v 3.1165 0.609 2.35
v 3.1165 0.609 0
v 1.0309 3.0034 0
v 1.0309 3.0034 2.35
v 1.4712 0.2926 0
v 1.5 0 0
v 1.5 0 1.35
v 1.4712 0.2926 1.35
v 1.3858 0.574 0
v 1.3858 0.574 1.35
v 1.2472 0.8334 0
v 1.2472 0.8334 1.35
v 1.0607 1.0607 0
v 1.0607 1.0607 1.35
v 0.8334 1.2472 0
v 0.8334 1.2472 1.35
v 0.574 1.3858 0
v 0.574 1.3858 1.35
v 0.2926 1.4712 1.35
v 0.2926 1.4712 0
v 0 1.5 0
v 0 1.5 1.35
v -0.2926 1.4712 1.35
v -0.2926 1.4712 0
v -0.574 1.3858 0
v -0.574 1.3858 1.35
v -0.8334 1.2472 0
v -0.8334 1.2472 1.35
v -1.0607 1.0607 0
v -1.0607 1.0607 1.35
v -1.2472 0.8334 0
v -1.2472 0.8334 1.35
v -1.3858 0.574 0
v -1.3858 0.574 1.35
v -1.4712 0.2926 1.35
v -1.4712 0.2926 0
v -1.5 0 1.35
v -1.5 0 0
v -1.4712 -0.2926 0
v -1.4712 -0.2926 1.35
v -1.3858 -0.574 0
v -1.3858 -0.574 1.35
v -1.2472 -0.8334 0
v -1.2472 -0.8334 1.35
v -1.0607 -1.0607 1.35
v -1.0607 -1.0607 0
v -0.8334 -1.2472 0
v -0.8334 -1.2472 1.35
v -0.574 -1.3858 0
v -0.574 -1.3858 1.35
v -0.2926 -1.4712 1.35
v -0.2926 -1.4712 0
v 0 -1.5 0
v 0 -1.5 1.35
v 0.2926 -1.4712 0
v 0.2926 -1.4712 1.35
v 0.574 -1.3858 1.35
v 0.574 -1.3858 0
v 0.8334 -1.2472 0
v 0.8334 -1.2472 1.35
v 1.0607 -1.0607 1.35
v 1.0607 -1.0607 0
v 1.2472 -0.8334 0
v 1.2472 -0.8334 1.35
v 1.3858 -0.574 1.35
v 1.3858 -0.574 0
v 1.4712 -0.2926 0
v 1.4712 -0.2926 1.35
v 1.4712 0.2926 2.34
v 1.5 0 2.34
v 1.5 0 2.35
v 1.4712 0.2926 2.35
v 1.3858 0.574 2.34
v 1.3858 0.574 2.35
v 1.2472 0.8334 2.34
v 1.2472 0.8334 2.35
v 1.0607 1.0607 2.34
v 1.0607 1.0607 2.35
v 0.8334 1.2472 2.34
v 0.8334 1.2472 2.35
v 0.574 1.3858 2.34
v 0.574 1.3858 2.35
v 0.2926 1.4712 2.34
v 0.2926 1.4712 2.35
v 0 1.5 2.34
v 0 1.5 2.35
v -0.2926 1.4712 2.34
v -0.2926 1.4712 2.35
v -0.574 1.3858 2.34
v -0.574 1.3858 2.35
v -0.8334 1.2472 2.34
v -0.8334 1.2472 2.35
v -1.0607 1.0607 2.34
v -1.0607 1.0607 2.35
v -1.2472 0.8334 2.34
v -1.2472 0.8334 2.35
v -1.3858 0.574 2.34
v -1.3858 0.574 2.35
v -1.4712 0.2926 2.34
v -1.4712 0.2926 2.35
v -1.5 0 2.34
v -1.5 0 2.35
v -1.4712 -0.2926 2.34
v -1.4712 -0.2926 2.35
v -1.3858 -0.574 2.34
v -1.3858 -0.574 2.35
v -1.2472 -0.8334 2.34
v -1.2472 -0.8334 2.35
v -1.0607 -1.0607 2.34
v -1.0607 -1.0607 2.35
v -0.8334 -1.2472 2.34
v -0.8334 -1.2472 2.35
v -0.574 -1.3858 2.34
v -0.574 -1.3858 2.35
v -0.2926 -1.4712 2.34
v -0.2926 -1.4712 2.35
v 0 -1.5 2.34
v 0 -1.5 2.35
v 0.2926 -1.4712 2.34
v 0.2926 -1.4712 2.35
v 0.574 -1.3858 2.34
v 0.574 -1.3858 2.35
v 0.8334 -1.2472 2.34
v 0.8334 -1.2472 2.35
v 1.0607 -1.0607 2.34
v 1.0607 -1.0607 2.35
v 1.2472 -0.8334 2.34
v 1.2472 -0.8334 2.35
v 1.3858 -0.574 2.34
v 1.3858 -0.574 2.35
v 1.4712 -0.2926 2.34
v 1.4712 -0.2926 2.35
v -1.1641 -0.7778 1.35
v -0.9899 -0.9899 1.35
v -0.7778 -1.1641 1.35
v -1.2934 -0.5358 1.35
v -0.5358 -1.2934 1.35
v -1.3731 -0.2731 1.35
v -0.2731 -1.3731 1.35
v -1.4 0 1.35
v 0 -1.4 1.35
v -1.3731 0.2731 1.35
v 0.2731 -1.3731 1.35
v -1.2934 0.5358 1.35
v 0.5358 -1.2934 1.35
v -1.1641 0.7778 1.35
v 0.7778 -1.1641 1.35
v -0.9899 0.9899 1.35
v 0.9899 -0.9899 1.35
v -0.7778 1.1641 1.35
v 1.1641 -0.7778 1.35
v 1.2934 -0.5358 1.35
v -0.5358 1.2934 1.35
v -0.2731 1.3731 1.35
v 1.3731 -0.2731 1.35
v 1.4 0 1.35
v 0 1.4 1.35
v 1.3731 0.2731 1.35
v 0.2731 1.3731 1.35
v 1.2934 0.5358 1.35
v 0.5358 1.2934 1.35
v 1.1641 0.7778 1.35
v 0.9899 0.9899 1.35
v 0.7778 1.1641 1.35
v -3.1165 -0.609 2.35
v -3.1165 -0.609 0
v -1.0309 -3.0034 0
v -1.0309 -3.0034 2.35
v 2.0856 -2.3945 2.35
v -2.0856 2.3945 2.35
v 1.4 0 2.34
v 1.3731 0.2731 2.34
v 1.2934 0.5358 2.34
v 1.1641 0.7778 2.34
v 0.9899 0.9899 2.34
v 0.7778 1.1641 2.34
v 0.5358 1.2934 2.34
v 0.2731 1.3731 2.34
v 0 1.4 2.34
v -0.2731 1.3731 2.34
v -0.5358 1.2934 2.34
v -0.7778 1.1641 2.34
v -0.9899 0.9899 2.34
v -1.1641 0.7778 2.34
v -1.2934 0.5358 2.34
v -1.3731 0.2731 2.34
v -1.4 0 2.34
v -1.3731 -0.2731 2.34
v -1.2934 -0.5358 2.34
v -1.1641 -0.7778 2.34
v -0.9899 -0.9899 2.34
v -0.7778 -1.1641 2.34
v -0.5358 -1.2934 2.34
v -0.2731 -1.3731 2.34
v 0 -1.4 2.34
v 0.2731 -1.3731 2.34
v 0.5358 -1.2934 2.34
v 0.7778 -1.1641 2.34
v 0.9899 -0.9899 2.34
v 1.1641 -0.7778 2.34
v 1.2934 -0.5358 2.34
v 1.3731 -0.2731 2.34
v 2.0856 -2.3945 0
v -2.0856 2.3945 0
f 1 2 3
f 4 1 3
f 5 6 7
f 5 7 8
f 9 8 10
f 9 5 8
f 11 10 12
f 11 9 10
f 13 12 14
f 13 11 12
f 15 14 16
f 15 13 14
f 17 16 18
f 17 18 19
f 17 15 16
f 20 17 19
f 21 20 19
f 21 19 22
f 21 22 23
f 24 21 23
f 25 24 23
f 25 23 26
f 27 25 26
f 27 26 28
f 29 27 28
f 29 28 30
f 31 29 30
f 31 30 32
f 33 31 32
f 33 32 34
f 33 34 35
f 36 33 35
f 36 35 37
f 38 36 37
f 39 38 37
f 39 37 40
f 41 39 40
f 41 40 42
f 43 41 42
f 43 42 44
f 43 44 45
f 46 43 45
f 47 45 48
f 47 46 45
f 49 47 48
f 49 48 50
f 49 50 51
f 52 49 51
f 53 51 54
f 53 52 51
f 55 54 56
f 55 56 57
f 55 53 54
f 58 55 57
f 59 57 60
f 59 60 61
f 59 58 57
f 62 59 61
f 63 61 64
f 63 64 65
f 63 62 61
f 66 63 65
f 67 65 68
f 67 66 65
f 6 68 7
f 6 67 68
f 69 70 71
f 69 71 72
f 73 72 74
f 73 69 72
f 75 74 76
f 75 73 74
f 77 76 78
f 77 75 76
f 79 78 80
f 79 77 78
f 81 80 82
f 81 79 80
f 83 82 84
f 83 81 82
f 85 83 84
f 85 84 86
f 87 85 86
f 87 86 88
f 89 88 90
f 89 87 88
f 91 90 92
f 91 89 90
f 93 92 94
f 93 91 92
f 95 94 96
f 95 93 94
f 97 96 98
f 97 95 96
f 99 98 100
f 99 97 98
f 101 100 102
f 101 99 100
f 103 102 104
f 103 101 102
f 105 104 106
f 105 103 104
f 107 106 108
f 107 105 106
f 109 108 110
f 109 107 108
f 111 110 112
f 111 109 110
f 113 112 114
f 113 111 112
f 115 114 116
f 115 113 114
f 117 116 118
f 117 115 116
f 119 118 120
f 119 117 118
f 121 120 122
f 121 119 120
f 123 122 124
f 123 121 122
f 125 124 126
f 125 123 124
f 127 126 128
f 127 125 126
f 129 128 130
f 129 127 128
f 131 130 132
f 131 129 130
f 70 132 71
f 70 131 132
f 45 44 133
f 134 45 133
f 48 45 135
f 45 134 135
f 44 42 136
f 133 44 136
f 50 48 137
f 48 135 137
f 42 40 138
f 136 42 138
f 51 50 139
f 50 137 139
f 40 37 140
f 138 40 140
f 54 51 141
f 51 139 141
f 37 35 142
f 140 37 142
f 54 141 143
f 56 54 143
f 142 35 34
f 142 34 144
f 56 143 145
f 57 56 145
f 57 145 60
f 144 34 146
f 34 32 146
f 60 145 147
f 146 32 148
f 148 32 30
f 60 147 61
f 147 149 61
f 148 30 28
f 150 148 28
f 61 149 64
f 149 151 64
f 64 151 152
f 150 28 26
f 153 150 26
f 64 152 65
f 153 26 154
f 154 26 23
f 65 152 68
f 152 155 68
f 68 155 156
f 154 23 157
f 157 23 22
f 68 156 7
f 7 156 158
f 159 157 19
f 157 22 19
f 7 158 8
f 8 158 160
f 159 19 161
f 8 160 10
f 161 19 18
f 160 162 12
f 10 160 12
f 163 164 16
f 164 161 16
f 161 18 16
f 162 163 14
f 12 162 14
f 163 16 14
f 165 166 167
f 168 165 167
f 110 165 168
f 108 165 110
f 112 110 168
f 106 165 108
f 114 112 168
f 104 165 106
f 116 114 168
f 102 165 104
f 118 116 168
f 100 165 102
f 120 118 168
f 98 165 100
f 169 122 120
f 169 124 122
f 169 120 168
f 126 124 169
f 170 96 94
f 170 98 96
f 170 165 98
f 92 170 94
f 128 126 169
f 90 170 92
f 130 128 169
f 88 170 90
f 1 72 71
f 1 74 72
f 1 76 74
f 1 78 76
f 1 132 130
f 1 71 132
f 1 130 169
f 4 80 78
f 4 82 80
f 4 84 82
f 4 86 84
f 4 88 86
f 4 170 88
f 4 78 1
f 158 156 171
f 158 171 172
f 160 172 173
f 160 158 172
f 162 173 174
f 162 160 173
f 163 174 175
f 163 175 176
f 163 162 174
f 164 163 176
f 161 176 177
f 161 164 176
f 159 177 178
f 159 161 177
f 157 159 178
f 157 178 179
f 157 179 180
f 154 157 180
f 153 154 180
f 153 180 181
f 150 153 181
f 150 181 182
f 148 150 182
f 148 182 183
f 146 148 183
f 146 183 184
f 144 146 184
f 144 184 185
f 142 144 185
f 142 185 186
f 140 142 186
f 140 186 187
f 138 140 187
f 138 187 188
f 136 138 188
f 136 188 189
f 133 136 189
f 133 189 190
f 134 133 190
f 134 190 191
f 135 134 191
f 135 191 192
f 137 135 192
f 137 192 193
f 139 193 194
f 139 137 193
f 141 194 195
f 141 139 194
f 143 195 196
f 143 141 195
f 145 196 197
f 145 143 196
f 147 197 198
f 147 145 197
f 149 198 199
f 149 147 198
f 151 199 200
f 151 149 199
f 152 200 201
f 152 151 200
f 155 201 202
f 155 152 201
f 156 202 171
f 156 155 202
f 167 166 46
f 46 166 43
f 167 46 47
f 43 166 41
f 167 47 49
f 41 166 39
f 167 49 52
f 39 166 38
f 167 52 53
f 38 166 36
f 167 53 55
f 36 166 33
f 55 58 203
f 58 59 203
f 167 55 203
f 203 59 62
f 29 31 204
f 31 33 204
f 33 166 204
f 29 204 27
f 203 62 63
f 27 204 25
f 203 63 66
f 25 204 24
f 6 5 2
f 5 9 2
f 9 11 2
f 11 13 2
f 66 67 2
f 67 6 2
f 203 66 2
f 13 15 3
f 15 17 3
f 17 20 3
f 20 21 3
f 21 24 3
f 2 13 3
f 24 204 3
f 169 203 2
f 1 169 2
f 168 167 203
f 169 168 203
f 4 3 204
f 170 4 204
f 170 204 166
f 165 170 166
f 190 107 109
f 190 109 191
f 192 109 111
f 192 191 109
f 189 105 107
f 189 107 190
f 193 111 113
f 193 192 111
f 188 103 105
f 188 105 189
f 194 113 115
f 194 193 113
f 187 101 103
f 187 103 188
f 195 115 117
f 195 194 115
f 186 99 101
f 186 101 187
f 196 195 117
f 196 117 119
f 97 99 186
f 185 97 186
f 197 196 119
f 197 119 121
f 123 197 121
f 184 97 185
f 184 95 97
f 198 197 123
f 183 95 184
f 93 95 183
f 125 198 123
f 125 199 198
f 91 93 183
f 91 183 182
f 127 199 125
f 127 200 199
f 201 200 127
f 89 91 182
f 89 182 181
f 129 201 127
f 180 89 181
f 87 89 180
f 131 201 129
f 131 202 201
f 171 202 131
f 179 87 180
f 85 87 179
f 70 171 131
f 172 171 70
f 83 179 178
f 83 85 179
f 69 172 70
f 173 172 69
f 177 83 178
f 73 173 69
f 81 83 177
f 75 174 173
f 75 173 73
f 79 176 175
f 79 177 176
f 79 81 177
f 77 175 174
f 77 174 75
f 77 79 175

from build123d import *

# Parameters (mm, degrees)
SKETCH1_R           = 1.5
BOSS_EXTRUDE1_DEPTH = 2.35
BOSS_EXTRUDE2_START = -1
SKETCH2_R           = 1.5
SKETCH2_R_2         = 1.4
BOSS_EXTRUDE2_DEPTH = 1
CUT_EXTRUDE1_START  = -0.01
SKETCH3_R           = 1.5
SKETCH3_R_2         = 1.4
CUT_EXTRUDE1_DEPTH  = 0.01


with BuildPart() as part:
    # Sketch1 → Boss-Extrude1 (new body)
    with BuildSketch(Plane.XY):
        Polygon((2.085613633, -2.394483056), (3.116489972, 0.608952861), (1.030876339, 3.003435917), (-2.085613633, 2.394483056), (-3.116489972, -0.608952861), (-1.030876339, -3.003435917), align=None)
        Circle(SKETCH1_R, mode=Mode.SUBTRACT)
    extrude(amount=BOSS_EXTRUDE1_DEPTH)

    # Sketch2 → Boss-Extrude2 (add)
    with BuildSketch(Plane.XY.offset(2.35).offset(BOSS_EXTRUDE2_START)):
        Circle(SKETCH2_R)
        Circle(SKETCH2_R_2, mode=Mode.SUBTRACT)
    extrude(amount=BOSS_EXTRUDE2_DEPTH)

    # Sketch3 → Cut-Extrude1 (cut)
    with BuildSketch(Plane.XY.offset(2.35).offset(CUT_EXTRUDE1_START)):
        Circle(SKETCH3_R)
        Circle(SKETCH3_R_2, mode=Mode.SUBTRACT)
    extrude(amount=CUT_EXTRUDE1_DEPTH, mode=Mode.SUBTRACT)


solid = part.part
